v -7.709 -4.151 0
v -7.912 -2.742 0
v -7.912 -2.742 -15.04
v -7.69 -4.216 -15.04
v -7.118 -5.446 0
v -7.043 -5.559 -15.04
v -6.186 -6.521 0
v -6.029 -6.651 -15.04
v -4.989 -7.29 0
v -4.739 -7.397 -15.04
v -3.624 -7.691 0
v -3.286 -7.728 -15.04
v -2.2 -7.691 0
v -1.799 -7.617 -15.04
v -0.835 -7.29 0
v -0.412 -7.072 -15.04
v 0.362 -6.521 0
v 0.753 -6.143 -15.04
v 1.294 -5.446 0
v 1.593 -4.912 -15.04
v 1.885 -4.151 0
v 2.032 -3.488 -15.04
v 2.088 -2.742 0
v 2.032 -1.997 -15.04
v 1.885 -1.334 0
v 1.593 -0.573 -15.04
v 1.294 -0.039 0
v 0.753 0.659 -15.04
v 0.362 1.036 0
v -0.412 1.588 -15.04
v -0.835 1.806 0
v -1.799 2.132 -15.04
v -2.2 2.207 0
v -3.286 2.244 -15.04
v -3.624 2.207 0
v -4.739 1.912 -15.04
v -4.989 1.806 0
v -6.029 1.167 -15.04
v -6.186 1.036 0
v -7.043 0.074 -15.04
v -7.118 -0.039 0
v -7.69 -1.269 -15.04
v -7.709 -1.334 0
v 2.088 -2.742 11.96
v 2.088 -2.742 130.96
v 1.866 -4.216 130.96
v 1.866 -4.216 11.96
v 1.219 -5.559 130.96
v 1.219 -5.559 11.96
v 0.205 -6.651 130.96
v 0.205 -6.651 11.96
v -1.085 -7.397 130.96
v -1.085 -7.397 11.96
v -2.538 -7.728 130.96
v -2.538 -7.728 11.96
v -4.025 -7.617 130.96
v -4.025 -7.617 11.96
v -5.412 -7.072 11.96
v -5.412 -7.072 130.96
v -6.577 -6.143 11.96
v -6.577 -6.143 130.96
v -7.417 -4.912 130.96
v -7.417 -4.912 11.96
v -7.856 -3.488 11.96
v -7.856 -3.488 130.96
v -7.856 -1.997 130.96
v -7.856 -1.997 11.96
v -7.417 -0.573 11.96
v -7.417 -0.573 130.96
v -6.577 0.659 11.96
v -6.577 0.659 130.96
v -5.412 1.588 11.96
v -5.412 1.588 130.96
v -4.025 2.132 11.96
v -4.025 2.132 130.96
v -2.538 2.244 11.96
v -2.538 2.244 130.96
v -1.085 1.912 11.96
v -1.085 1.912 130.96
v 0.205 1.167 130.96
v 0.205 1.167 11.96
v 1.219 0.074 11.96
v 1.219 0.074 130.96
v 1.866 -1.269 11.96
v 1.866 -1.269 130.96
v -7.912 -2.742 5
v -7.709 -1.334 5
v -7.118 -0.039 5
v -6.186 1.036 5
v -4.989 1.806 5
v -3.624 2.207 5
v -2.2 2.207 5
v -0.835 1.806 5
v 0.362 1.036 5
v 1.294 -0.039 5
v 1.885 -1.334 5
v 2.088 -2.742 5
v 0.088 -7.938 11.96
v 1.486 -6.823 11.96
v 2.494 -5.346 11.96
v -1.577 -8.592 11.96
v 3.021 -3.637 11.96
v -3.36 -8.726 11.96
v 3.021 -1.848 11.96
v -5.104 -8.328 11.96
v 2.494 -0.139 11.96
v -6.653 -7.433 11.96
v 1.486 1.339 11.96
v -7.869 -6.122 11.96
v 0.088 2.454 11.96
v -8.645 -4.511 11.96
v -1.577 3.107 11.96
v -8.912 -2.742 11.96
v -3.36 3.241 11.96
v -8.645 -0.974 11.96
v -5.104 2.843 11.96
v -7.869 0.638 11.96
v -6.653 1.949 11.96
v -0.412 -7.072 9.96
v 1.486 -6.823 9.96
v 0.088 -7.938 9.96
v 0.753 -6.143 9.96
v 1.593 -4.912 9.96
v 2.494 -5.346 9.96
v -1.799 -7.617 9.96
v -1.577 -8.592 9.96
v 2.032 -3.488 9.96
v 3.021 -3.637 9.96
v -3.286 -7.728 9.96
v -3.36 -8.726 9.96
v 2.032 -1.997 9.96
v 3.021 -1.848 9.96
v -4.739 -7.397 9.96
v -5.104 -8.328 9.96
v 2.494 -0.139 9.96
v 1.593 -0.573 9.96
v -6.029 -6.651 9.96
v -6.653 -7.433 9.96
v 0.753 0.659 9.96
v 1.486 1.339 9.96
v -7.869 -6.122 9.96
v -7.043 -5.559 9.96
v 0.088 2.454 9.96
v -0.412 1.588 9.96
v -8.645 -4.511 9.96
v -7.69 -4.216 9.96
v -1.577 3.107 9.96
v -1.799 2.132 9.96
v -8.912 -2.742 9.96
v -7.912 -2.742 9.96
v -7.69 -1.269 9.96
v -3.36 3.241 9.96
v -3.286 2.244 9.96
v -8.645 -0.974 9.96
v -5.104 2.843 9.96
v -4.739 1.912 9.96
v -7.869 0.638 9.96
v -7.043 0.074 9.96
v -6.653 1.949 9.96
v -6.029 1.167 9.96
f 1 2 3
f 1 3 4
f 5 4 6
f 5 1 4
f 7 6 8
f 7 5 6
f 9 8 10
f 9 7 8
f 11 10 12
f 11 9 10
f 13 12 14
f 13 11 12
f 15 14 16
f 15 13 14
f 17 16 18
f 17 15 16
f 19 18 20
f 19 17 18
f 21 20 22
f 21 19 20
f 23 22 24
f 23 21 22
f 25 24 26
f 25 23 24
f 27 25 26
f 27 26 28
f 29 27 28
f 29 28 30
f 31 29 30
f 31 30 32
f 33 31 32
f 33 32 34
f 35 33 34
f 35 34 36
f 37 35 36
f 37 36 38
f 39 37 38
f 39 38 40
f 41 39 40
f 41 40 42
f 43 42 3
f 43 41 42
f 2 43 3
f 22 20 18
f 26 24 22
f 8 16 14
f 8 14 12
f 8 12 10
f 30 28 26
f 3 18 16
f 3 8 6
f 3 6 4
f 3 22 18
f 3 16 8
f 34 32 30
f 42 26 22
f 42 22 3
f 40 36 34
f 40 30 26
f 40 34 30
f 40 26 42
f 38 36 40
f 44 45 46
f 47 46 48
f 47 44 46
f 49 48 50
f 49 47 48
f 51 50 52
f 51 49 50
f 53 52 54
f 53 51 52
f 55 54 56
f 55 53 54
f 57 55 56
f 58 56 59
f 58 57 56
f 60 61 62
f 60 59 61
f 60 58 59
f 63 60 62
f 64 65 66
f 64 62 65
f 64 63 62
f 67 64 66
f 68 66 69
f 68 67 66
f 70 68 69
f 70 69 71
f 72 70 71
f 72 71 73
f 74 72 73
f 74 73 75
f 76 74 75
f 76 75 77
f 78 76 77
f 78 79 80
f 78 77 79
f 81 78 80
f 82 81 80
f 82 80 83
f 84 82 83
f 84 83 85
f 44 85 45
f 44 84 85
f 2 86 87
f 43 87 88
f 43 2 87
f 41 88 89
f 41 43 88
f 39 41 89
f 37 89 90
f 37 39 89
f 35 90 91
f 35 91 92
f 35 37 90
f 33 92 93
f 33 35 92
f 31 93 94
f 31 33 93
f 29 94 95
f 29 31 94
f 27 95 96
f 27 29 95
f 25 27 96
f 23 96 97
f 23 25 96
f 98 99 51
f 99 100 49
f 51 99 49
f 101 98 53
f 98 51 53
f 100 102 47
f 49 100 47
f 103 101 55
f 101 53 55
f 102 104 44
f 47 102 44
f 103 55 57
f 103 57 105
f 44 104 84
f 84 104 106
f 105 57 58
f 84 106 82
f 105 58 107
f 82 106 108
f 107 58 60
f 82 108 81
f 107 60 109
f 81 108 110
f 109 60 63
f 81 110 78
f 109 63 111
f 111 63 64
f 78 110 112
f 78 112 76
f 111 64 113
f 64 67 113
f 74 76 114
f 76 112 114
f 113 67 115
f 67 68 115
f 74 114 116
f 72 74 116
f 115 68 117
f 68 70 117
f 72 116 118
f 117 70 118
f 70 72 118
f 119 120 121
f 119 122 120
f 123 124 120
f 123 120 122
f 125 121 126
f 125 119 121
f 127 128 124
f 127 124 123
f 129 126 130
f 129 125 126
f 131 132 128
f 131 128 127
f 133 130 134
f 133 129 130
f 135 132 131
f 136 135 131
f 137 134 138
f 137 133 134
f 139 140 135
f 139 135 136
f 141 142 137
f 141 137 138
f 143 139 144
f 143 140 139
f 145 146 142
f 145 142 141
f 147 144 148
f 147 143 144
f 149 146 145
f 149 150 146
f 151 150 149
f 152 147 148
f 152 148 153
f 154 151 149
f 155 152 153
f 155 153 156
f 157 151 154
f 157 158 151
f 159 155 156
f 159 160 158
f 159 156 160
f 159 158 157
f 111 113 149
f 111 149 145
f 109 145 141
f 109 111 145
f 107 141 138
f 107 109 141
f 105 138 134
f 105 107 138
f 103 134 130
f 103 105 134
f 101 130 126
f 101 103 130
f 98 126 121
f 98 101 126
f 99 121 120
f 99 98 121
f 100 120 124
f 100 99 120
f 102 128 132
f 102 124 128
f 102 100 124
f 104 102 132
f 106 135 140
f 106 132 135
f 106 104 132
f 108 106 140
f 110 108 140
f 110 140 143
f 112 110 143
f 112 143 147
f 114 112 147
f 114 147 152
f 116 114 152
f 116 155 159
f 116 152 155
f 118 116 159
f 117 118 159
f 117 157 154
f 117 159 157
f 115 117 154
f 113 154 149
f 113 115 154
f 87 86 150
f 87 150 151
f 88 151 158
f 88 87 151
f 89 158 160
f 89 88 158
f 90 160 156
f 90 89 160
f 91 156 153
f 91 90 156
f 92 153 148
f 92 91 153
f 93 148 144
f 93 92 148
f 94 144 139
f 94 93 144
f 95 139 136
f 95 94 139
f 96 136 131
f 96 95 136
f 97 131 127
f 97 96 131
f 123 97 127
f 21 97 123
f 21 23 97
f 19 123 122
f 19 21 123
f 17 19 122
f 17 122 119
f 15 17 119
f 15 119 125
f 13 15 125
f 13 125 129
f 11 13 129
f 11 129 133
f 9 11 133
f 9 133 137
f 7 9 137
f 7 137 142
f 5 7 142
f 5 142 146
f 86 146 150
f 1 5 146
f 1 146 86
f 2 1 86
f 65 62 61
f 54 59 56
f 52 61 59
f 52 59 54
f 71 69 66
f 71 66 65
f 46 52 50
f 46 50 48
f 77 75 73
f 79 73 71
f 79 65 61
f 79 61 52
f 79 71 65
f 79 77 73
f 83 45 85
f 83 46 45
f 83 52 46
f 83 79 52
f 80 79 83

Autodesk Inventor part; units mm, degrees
ref_plane "YZ Plane" through (0, 0, 0) normal (1, 0, 0) x (0, 1, 0)
sketch "Szkic1" plane through (0, 0, 0) normal (0, 0, 1) x (1, 0, 0)
  circle A0 centre (-2.912, -2.7423) radius 5.3 projected
  circle A1 centre (-2.912, -2.7423) radius 5
  point P0 (0, 0)
  dimension "d0" = 10
extrude "Wyciągnięcie proste1" add sketch "Szkic1" along normal blind 120 contours A1
sketch "Szkic2" plane through (-2.912, -2.7423, 5) normal (0, 0, -1) x (-1, 0, 0)
  circle A0 centre (0, 0) radius 5 projected
  circle A1 centre (0, 0) radius 4.284
  point P0 (-2.912, 2.7423)
ref_plane "Płaszczyzna konstrukcyjna1" through (-12.2191, -12.0493, 11.96) normal (0, 0, -1) x (-0.4239, 0.9057, 0)
extrude "Wyciągnięcie proste2" cut sketch "Szkic2" against normal up to surface (6.96 mm away)
extrude "Wyciągnięcie proste3" cut sketch "Szkic2" against normal blind 5 contours A1
sketch "Szkic3" plane through (-2.912, -2.7423, 10) normal (0, 0, -1) x (-1, 0, 0)
  circle A0 centre (0, 0) radius 4.284 projected
  circle A1 centre (0, 0) radius 4.284 projected
  circle A2 centre (0, 0) radius 5 projected
  point P0 (-2.912, 2.7423)
ref_plane "Płaszczyzna konstrukcyjna2" through (-9.0993, -8.9295, 0) normal (0, 0, 1) x (1, 0, 0)
extrude "Wyciągnięcie proste4" add sketch "Szkic3" along normal up to surface (10 mm away) contours A0 | A2
sketch "Szkic4" plane through (-2.912, -2.7423, 11.96) normal (0, 0, -1) x (-1, 0, 0)
  circle A0 centre (0, 0) radius 5 projected
  circle A1 centre (0, 0) radius 6
  point P0 (-2.912, 2.7423)
  dimension "d15" = 12
extrude "Wyciągnięcie proste5" add sketch "Szkic4" along normal blind 2 contours A0 | A1
sketch "Szkic5" plane through (-2.912, -2.7423, 9.96) normal (0, 0, -1) x (-1, 0, 0)
  circle A0 centre (0, 0) radius 5 projected
  circle A1 centre (0, 0) radius 5 projected
  circle A2 centre (0, 0) radius 5
  point P0 (-2.912, 2.7423)
extrude "Wyciągnięcie proste6" add sketch "Szkic5" along normal blind 25
sketch "Szkic6" plane through (-2.912, -2.7423, 116) normal (0, 0, 1) x (1, 0, 0)
  circle A0 centre (0, 0) radius 5 projected
  point P0 (2.912, 2.7423)
extrude "Wyciągnięcie proste7" add sketch "Szkic6" along normal blind 15
sketch "Szkic7" plane through (-2.912, -2.7423, 131) normal (0, 0, 1) x (1, 0, 0)
  circle A0 centre (0, 0) radius 5 projected
  point P0 (2.912, 2.7423)
extrude "Wyciągnięcie proste8" cut sketch "Szkic7" against normal blind 0.04
properties part number "wał_2"
